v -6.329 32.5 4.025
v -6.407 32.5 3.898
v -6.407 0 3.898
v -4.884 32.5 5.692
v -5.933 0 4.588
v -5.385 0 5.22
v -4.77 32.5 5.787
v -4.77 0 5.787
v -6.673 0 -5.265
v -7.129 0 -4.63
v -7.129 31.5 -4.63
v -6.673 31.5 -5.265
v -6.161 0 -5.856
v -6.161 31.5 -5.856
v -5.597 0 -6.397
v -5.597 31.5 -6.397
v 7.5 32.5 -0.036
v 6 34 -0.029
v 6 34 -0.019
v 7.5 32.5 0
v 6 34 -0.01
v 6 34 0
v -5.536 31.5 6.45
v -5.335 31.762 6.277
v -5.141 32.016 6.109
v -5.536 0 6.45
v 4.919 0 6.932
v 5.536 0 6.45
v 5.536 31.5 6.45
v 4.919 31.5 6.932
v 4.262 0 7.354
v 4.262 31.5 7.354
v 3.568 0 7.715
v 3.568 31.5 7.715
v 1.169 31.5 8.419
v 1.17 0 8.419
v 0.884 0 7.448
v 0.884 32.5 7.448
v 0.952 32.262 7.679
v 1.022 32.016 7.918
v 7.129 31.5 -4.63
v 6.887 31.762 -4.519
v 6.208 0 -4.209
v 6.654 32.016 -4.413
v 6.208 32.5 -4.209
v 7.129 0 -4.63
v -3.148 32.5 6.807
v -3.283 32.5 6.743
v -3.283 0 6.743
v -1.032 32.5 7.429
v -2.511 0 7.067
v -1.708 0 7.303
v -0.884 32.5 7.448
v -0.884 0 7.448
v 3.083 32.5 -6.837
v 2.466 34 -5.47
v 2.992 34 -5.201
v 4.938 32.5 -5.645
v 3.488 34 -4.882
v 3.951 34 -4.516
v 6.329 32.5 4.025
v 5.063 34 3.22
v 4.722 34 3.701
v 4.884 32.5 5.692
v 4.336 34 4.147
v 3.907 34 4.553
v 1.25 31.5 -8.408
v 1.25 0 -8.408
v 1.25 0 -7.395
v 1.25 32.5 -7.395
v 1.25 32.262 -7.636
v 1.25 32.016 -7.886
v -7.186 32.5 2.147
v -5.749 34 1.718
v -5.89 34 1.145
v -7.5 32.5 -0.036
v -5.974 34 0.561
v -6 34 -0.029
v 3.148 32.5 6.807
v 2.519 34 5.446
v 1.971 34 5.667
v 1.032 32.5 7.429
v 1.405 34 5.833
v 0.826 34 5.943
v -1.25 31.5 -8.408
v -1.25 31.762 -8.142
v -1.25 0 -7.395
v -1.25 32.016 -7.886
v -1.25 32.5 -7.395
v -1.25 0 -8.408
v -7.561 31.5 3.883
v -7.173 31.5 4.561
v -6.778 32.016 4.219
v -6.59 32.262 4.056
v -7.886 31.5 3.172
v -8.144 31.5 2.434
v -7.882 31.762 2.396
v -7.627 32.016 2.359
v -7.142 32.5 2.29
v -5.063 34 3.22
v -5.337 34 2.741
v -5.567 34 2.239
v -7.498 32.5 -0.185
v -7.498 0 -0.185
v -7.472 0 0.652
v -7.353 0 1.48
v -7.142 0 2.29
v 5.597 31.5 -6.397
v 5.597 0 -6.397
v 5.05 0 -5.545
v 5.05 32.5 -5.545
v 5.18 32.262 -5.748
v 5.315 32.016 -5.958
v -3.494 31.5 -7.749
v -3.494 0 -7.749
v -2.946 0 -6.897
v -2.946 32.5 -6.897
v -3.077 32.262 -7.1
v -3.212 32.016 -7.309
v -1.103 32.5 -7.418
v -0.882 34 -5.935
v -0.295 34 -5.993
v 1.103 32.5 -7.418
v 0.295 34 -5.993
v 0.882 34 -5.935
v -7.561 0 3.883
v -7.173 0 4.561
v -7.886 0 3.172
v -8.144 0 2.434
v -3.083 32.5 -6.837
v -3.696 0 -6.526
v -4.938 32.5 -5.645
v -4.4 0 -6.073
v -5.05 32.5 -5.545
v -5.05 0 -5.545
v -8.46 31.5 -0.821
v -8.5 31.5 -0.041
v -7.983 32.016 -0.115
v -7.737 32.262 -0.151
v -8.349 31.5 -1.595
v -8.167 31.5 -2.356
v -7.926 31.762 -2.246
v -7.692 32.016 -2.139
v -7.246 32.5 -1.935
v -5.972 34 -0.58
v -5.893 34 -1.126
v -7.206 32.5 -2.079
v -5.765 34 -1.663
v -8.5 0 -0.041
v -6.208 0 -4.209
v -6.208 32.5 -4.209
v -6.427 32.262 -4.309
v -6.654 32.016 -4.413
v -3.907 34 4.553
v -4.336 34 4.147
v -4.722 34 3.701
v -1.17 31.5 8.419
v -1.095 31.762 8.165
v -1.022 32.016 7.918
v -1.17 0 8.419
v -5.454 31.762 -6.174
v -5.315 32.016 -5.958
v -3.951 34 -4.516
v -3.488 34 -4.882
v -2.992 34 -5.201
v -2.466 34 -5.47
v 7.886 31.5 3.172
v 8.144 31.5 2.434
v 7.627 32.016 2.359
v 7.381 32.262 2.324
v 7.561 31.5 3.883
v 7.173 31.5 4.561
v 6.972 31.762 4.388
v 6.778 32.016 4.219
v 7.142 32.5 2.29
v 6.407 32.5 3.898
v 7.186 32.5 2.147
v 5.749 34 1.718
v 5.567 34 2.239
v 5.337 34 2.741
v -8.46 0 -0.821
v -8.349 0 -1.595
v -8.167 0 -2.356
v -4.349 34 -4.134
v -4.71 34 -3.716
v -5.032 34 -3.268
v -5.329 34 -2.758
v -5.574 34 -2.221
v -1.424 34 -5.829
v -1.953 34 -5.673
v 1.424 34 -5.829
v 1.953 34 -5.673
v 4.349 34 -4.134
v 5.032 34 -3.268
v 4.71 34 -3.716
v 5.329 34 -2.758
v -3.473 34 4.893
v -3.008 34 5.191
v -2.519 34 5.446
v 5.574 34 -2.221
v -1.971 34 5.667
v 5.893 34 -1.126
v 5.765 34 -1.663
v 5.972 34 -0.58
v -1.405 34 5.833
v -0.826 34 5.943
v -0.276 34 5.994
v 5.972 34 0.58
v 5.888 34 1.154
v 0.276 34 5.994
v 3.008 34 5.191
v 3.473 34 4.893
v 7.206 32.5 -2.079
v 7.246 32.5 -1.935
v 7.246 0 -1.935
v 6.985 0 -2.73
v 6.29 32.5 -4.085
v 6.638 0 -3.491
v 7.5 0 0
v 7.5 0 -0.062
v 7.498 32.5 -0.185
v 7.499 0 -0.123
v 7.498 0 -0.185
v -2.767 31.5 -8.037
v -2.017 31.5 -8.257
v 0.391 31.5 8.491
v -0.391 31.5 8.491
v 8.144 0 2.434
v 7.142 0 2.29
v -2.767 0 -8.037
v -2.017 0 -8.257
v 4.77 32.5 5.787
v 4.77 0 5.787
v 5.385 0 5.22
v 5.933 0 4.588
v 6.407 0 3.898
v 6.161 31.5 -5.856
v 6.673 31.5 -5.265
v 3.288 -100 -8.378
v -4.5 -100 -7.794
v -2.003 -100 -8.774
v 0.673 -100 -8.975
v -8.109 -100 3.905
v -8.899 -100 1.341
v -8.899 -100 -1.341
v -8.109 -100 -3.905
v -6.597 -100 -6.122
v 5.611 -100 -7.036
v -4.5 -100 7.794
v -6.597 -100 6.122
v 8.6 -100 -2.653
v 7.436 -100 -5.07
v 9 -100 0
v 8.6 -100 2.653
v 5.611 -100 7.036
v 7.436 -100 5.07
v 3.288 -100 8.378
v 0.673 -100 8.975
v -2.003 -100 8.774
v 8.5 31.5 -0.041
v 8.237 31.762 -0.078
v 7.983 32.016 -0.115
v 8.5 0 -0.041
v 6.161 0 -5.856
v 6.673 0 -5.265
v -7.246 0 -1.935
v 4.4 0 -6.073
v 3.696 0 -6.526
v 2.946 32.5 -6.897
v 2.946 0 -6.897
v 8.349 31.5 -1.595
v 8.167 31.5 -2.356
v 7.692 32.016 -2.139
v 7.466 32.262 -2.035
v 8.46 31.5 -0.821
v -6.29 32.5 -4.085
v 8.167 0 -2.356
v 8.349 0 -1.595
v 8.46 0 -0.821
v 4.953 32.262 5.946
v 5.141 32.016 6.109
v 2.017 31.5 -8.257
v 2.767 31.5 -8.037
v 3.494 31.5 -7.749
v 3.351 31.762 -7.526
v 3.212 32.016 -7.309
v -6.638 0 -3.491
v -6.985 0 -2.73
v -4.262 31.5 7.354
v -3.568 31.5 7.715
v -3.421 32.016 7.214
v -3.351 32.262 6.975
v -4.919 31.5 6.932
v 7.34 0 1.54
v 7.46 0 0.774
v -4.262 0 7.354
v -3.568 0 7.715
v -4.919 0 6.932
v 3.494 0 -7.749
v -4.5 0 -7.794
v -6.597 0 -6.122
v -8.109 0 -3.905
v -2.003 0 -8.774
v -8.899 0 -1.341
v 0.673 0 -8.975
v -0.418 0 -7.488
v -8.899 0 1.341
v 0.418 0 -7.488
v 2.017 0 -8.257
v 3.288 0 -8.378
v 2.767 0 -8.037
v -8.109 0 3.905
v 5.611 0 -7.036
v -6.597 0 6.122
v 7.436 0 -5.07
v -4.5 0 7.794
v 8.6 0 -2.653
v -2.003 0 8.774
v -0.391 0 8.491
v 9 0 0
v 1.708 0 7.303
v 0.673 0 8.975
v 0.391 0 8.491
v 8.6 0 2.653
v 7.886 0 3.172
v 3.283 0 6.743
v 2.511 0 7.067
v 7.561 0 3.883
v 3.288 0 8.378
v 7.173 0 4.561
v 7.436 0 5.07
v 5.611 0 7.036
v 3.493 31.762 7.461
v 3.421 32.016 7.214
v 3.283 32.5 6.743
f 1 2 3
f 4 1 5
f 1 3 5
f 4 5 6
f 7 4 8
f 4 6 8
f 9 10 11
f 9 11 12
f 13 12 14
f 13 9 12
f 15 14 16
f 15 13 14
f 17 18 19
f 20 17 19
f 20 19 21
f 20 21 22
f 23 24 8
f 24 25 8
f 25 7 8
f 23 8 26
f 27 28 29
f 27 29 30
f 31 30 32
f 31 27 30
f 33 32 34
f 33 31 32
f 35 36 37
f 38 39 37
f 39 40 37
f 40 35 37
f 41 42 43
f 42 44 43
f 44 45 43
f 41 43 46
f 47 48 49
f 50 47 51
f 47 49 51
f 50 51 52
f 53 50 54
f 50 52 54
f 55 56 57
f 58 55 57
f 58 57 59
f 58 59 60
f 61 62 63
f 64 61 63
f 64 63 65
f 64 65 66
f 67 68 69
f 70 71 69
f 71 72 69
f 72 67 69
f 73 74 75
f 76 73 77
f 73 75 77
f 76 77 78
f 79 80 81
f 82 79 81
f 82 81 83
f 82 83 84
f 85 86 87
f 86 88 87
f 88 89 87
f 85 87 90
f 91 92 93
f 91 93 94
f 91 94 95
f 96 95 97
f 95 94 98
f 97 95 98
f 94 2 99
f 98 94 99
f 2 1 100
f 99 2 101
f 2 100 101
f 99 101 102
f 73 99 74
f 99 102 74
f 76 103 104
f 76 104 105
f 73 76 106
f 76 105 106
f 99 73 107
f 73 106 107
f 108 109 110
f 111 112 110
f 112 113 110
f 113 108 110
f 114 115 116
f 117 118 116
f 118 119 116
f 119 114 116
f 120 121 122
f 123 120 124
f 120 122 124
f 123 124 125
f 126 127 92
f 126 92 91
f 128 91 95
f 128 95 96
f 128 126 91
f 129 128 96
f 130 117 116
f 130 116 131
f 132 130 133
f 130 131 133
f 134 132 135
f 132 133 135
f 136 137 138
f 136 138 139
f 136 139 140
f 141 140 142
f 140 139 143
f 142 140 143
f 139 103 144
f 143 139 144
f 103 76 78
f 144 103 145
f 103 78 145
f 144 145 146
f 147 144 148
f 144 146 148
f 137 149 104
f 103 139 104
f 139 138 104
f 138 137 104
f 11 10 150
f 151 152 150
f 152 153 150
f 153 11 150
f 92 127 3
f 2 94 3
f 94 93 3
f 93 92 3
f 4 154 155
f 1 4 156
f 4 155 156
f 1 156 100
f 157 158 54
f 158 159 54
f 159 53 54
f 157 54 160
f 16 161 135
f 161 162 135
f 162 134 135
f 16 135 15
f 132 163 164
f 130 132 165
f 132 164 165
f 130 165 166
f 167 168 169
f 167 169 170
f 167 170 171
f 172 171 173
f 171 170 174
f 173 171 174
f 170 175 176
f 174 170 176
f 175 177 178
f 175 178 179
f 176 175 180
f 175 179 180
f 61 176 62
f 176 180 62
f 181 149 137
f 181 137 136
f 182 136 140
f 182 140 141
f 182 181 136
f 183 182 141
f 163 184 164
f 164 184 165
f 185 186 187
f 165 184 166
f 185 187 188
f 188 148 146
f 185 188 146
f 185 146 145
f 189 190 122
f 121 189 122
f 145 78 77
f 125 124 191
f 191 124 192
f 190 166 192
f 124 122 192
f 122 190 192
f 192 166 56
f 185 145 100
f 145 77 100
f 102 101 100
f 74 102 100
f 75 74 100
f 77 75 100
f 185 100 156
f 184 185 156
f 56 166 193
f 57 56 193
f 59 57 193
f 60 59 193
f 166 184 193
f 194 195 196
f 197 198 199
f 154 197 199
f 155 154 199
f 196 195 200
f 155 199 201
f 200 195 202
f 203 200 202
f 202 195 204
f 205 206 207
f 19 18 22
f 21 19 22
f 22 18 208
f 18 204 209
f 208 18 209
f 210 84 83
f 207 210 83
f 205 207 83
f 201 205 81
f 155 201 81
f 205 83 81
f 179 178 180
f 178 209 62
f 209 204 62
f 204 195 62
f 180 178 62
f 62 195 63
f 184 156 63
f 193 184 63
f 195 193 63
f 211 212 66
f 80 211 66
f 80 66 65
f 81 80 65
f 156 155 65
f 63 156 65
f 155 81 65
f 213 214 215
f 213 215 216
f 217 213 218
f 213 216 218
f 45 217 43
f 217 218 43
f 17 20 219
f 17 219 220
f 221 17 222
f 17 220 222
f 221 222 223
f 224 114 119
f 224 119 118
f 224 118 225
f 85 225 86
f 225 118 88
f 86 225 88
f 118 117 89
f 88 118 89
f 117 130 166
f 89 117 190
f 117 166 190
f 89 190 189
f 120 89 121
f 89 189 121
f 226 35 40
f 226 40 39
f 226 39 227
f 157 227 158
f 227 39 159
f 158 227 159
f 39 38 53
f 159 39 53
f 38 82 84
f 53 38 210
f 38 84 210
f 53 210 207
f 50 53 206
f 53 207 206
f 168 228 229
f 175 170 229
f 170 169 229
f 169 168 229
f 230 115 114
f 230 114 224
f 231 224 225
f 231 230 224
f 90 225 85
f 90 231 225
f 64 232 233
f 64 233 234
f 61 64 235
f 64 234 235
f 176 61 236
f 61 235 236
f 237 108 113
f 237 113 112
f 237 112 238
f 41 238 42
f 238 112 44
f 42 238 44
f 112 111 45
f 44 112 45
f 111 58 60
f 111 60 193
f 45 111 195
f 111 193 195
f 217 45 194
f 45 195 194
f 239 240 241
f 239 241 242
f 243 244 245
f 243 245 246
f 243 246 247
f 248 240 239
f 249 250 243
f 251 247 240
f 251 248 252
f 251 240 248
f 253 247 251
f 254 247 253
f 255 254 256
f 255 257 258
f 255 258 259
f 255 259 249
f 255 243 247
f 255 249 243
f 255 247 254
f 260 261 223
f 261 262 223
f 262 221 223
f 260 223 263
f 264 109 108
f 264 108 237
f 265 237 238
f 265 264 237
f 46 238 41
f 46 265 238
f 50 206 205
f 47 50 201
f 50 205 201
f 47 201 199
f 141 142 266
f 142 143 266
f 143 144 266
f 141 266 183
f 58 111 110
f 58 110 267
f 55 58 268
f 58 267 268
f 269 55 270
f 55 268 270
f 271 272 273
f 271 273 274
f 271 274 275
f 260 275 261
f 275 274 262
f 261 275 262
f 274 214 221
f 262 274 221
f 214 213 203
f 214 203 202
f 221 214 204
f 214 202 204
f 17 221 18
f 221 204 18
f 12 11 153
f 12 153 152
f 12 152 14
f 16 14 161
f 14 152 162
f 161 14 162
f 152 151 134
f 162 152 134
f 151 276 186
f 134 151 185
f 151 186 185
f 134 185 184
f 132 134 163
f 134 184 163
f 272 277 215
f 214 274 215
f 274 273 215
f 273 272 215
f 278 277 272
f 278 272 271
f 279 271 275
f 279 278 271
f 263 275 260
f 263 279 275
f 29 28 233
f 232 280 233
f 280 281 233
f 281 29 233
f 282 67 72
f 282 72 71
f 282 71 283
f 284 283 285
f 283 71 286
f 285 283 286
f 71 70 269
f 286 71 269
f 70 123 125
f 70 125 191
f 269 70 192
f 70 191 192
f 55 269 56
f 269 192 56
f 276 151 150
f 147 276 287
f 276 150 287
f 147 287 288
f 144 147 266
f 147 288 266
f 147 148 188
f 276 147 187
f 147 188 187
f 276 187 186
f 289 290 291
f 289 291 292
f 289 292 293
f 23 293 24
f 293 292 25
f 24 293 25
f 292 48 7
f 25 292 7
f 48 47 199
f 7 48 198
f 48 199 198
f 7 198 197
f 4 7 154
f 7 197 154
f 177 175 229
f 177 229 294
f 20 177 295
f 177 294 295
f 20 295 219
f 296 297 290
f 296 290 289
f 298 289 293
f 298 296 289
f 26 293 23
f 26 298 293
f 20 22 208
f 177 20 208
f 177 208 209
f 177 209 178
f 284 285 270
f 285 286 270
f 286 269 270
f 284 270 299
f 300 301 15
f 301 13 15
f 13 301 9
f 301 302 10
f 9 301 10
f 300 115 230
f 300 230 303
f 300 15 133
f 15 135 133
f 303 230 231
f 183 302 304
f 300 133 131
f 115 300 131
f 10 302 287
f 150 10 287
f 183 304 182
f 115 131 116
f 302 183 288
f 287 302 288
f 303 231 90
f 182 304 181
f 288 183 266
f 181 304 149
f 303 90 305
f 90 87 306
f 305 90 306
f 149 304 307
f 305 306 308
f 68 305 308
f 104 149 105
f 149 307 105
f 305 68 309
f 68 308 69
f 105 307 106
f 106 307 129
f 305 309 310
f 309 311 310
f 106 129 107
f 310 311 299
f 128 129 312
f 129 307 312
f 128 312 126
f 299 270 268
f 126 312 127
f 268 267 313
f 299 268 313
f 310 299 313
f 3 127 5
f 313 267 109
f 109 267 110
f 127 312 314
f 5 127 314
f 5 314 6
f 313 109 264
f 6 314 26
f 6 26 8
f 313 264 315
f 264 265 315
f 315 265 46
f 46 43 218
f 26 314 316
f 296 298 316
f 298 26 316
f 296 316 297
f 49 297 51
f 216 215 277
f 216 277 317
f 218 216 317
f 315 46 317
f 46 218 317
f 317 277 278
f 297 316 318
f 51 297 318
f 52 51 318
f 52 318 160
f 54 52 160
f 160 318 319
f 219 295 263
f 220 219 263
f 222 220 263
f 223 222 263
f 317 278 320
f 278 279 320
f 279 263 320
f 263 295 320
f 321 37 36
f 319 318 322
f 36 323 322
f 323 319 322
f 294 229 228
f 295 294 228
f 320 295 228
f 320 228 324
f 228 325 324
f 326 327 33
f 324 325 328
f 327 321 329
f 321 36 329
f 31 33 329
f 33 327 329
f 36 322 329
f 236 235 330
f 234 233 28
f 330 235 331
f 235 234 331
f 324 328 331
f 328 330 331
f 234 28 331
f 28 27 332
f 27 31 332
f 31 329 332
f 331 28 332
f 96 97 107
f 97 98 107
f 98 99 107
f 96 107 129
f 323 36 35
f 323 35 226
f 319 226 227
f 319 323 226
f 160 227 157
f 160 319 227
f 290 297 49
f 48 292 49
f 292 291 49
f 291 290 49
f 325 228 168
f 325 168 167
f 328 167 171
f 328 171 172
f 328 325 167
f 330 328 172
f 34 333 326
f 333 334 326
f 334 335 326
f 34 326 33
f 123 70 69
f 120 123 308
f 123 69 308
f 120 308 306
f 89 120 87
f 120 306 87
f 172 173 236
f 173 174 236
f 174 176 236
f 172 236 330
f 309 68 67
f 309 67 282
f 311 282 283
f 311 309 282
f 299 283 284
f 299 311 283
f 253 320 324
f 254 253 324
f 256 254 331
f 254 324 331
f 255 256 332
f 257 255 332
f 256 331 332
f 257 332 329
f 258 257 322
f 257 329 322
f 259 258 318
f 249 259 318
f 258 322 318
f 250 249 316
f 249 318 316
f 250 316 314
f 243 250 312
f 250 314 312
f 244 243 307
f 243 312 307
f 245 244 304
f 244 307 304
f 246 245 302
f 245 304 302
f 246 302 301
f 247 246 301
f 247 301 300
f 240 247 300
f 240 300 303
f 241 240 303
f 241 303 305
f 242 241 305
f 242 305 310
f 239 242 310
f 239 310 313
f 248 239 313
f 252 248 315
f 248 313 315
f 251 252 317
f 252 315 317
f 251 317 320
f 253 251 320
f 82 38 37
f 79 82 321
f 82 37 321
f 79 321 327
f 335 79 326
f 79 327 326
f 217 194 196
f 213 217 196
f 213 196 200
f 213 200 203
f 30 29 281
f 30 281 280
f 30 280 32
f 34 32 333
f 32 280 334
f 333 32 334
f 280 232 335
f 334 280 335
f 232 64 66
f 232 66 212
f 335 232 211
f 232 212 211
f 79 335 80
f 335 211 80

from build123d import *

# Parameters (mm, degrees)
F0_R     = 9
F1_DEPTH = 100
F3_DEPTH = 34
F4_SIZE  = 2.5
F5_DEPTH = 34


with BuildPart() as f1:
    # F0 (on Front) → F1 (new body)
    with BuildSketch(Plane.XZ):
        Circle(F0_R)
    extrude(amount=F1_DEPTH)

    # F2 (on Front) → F3 (join)
    with BuildSketch(Plane.XZ):
        with BuildLine():
            ThreePointArc((8.499903, -0.040575), (8.499976, -0.020288), (8.5, 0))
            ThreePointArc((8.5, 0), (8.410571, 1.229754), (8.144166, 2.433631))
            Line((8.144166, 2.433631), (7.141912, 2.28978))
            ThreePointArc((7.141912, 2.28978), (7.409937, 1.158806), (7.5, 0))
            ThreePointArc((7.5, 0), (7.49943, -0.092467), (7.49772, -0.184919))
            Line((7.49772, -0.184919), (8.499903, -0.040575))
        make_face()
        with BuildLine():
            Line((7.141912, 2.28978), (8.144166, 2.433631))
            ThreePointArc((8.144166, 2.433631), (7.731872, 3.531028), (7.17251, 4.56126))
            Line((7.17251, 4.56126), (6.407458, 3.89801))
            ThreePointArc((6.407458, 3.89801), (6.82224, 3.115613), (7.141912, 2.28978))
        make_face()
        with BuildLine():
            ThreePointArc((8.167029, -2.355768), (8.413482, -1.209676), (8.499903, -0.040575))
            Line((8.499903, -0.040575), (7.49772, -0.184919))
            ThreePointArc((7.49772, -0.184919), (7.423661, -1.067361), (7.246107, -1.934923))
            Line((7.246107, -1.934923), (8.167029, -2.355768))
        make_face()
        with BuildLine():
            Line((6.407458, 3.89801), (7.17251, 4.56126))
            ThreePointArc((7.17251, 4.56126), (6.423871, 5.566316), (5.535588, 6.450369))
            Line((5.535588, 6.450369), (4.77021, 5.787495))
            ThreePointArc((4.77021, 5.787495), (5.668122, 4.911456), (6.407458, 3.89801))
        make_face()
        with BuildLine():
            ThreePointArc((7.128637, -4.629529), (7.731872, -3.531028), (8.167029, -2.355768))
            Line((8.167029, -2.355768), (7.246107, -1.934923))
            ThreePointArc((7.246107, -1.934923), (6.82224, -3.115613), (6.207509, -4.209137))
            Line((6.207509, -4.209137), (7.128637, -4.629529))
        make_face()
        with BuildLine():
            Line((4.77021, 5.787495), (5.535588, 6.450369))
            ThreePointArc((5.535588, 6.450369), (4.595447, 7.150655), (3.567896, 7.714928))
            Line((3.567896, 7.714928), (3.282874, 6.743348))
            ThreePointArc((3.282874, 6.743348), (4.054806, 6.309401), (4.77021, 5.787495))
        make_face()
        with BuildLine():
            ThreePointArc((5.596918, -6.397227), (6.423871, -5.566316), (7.128637, -4.629529))
            Line((7.128637, -4.629529), (6.207509, -4.209137))
            ThreePointArc((6.207509, -4.209137), (5.668122, -4.911456), (5.049715, -5.545302))
            Line((5.049715, -5.545302), (5.596918, -6.397227))
        make_face()
        with BuildLine():
            Line((3.282874, 6.743348), (3.567896, 7.714928))
            ThreePointArc((3.567896, 7.714928), (2.394727, 8.15569), (1.1695, 8.419161))
            Line((1.1695, 8.419161), (0.884, 7.447721))
            ThreePointArc((0.884, 7.447721), (2.112994, 7.196197), (3.282874, 6.743348))
        make_face()
        with BuildLine():
            ThreePointArc((3.494079, -7.748639), (4.595447, -7.150655), (5.596918, -6.397227))
            Line((5.596918, -6.397227), (5.049715, -5.545302))
            ThreePointArc((5.049715, -5.545302), (4.054806, -6.309401), (2.946457, -6.896984))
            Line((2.946457, -6.896984), (3.494079, -7.748639))
        make_face()
        with BuildLine():
            Line((0.884, 7.447721), (1.1695, 8.419161))
            ThreePointArc((1.1695, 8.419161), (0, 8.5), (-1.1695, 8.419161))
            Line((-1.1695, 8.419161), (-0.884, 7.447721))
            ThreePointArc((-0.884, 7.447721), (0, 7.5), (0.884, 7.447721))
        make_face()
        with BuildLine():
            ThreePointArc((1.249825, -8.407612), (2.394727, -8.15569), (3.494079, -7.748639))
            Line((3.494079, -7.748639), (2.946457, -6.896984))
            ThreePointArc((2.946457, -6.896984), (2.112994, -7.196197), (1.250074, -7.395087))
            Line((1.250074, -7.395087), (1.249825, -8.407612))
        make_face()
        with BuildLine():
            Line((-0.884, 7.447721), (-1.1695, 8.419161))
            ThreePointArc((-1.1695, 8.419161), (-2.394727, 8.15569), (-3.567896, 7.714928))
            Line((-3.567896, 7.714928), (-3.282874, 6.743348))
            ThreePointArc((-3.282874, 6.743348), (-2.112994, 7.196197), (-0.884, 7.447721))
        make_face()
        with BuildLine():
            ThreePointArc((-1.249825, -8.407612), (0, -8.5), (1.249825, -8.407612))
            Line((1.249825, -8.407612), (1.250074, -7.395087))
            ThreePointArc((1.250074, -7.395087), (0, -7.5), (-1.250074, -7.395087))
            Line((-1.250074, -7.395087), (-1.249825, -8.407612))
        make_face()
        with BuildLine():
            Line((-3.282874, 6.743348), (-3.567896, 7.714928))
            ThreePointArc((-3.567896, 7.714928), (-4.595447, 7.150655), (-5.535588, 6.450369))
            Line((-5.535588, 6.450369), (-4.77021, 5.787495))
            ThreePointArc((-4.77021, 5.787495), (-4.054806, 6.309401), (-3.282874, 6.743348))
        make_face()
        with BuildLine():
            ThreePointArc((-3.494079, -7.748639), (-2.394727, -8.15569), (-1.249825, -8.407612))
            Line((-1.249825, -8.407612), (-1.250074, -7.395087))
            ThreePointArc((-1.250074, -7.395087), (-2.112994, -7.196197), (-2.946457, -6.896984))
            Line((-2.946457, -6.896984), (-3.494079, -7.748639))
        make_face()
        with BuildLine():
            Line((-4.77021, 5.787495), (-5.535588, 6.450369))
            ThreePointArc((-5.535588, 6.450369), (-6.423871, 5.566316), (-7.17251, 4.56126))
            Line((-7.17251, 4.56126), (-6.407458, 3.89801))
            ThreePointArc((-6.407458, 3.89801), (-5.668122, 4.911456), (-4.77021, 5.787495))
        make_face()
        with BuildLine():
            ThreePointArc((-5.596918, -6.397227), (-4.595447, -7.150655), (-3.494079, -7.748639))
            Line((-3.494079, -7.748639), (-2.946457, -6.896984))
            ThreePointArc((-2.946457, -6.896984), (-4.054806, -6.309401), (-5.049715, -5.545302))
            Line((-5.049715, -5.545302), (-5.596918, -6.397227))
        make_face()
        with BuildLine():
            Line((-6.407458, 3.89801), (-7.17251, 4.56126))
            ThreePointArc((-7.17251, 4.56126), (-7.731872, 3.531028), (-8.144166, 2.433631))
            Line((-8.144166, 2.433631), (-7.141912, 2.28978))
            ThreePointArc((-7.141912, 2.28978), (-6.82224, 3.115613), (-6.407458, 3.89801))
        make_face()
        with BuildLine():
            ThreePointArc((-7.128637, -4.629529), (-6.423871, -5.566316), (-5.596918, -6.397227))
            Line((-5.596918, -6.397227), (-5.049715, -5.545302))
            ThreePointArc((-5.049715, -5.545302), (-5.668122, -4.911456), (-6.207509, -4.209137))
            Line((-6.207509, -4.209137), (-7.128637, -4.629529))
        make_face()
        with BuildLine():
            Line((-7.141912, 2.28978), (-8.144166, 2.433631))
            ThreePointArc((-8.144166, 2.433631), (-8.413482, 1.209676), (-8.499903, -0.040575))
            Line((-8.499903, -0.040575), (-7.49772, -0.184919))
            ThreePointArc((-7.49772, -0.184919), (-7.423661, 1.067361), (-7.141912, 2.28978))
        make_face()
        with BuildLine():
            ThreePointArc((-8.167029, -2.355768), (-7.731872, -3.531028), (-7.128637, -4.629529))
            Line((-7.128637, -4.629529), (-6.207509, -4.209137))
            ThreePointArc((-6.207509, -4.209137), (-6.82224, -3.115613), (-7.246107, -1.934923))
            Line((-7.246107, -1.934923), (-8.167029, -2.355768))
        make_face()
        with BuildLine():
            Line((-7.49772, -0.184919), (-8.499903, -0.040575))
            ThreePointArc((-8.499903, -0.040575), (-8.413482, -1.209676), (-8.167029, -2.355768))
            Line((-8.167029, -2.355768), (-7.246107, -1.934923))
            ThreePointArc((-7.246107, -1.934923), (-7.423661, -1.067361), (-7.49772, -0.184919))
        make_face()
        with BuildLine():
            ThreePointArc((7.5, 0), (7.409937, 1.158806), (7.141912, 2.28978))
            ThreePointArc((7.141912, 2.28978), (6.82224, 3.115613), (6.407458, 3.89801))
            ThreePointArc((6.407458, 3.89801), (5.668122, 4.911456), (4.77021, 5.787495))
            ThreePointArc((4.77021, 5.787495), (4.054806, 6.309401), (3.282874, 6.743348))
            ThreePointArc((3.282874, 6.743348), (2.112994, 7.196197), (0.884, 7.447721))
            ThreePointArc((0.884, 7.447721), (0, 7.5), (-0.884, 7.447721))
            ThreePointArc((-0.884, 7.447721), (-2.112994, 7.196197), (-3.282874, 6.743348))
            ThreePointArc((-3.282874, 6.743348), (-4.054806, 6.309401), (-4.77021, 5.787495))
            ThreePointArc((-4.77021, 5.787495), (-5.668122, 4.911456), (-6.407458, 3.89801))
            ThreePointArc((-6.407458, 3.89801), (-6.82224, 3.115613), (-7.141912, 2.28978))
            ThreePointArc((-7.141912, 2.28978), (-7.423661, 1.067361), (-7.49772, -0.184919))
            ThreePointArc((-7.49772, -0.184919), (-7.423661, -1.067361), (-7.246107, -1.934923))
            ThreePointArc((-7.246107, -1.934923), (-6.82224, -3.115613), (-6.207509, -4.209137))
            ThreePointArc((-6.207509, -4.209137), (-5.668122, -4.911456), (-5.049715, -5.545302))
            ThreePointArc((-5.049715, -5.545302), (-4.054806, -6.309401), (-2.946457, -6.896984))
            ThreePointArc((-2.946457, -6.896984), (-2.112994, -7.196197), (-1.250074, -7.395087))
            ThreePointArc((-1.250074, -7.395087), (0, -7.5), (1.250074, -7.395087))
            ThreePointArc((1.250074, -7.395087), (2.112994, -7.196197), (2.946457, -6.896984))
            ThreePointArc((2.946457, -6.896984), (4.054806, -6.309401), (5.049715, -5.545302))
            ThreePointArc((5.049715, -5.545302), (5.668122, -4.911456), (6.207509, -4.209137))
            ThreePointArc((6.207509, -4.209137), (6.82224, -3.115613), (7.246107, -1.934923))
            ThreePointArc((7.246107, -1.934923), (7.423661, -1.067361), (7.49772, -0.184919))
            ThreePointArc((7.49772, -0.184919), (7.49943, -0.092467), (7.5, 0))
        make_face()
    extrude(amount=-F3_DEPTH)

    # F4
    f4_edges = [f1.edges().sort_by_distance(p)[0] for p in [
        (8.499903, 34, 0.040575),
    ]]
    chamfer(f4_edges, length=F4_SIZE)

    # F2 (on Front) → F5 (cut)
    with BuildSketch(Plane.XZ):
        with BuildLine():
            ThreePointArc((-5.596918, -6.397227), (-4.595447, -7.150655), (-3.494079, -7.748639))
            Line((-3.494079, -7.748639), (-2.946457, -6.896984))
            ThreePointArc((-2.946457, -6.896984), (-4.054806, -6.309401), (-5.049715, -5.545302))
            Line((-5.049715, -5.545302), (-5.596918, -6.397227))
        make_face()
        with BuildLine():
            ThreePointArc((-8.167029, -2.355768), (-7.731872, -3.531028), (-7.128637, -4.629529))
            Line((-7.128637, -4.629529), (-6.207509, -4.209137))
            ThreePointArc((-6.207509, -4.209137), (-6.82224, -3.115613), (-7.246107, -1.934923))
            Line((-7.246107, -1.934923), (-8.167029, -2.355768))
        make_face()
        with BuildLine():
            Line((-7.141912, 2.28978), (-8.144166, 2.433631))
            ThreePointArc((-8.144166, 2.433631), (-8.413482, 1.209676), (-8.499903, -0.040575))
            Line((-8.499903, -0.040575), (-7.49772, -0.184919))
            ThreePointArc((-7.49772, -0.184919), (-7.423661, 1.067361), (-7.141912, 2.28978))
        make_face()
        with BuildLine():
            Line((-4.77021, 5.787495), (-5.535588, 6.450369))
            ThreePointArc((-5.535588, 6.450369), (-6.423871, 5.566316), (-7.17251, 4.56126))
            Line((-7.17251, 4.56126), (-6.407458, 3.89801))
            ThreePointArc((-6.407458, 3.89801), (-5.668122, 4.911456), (-4.77021, 5.787495))
        make_face()
        with BuildLine():
            Line((-0.884, 7.447721), (-1.1695, 8.419161))
            ThreePointArc((-1.1695, 8.419161), (-2.394727, 8.15569), (-3.567896, 7.714928))
            Line((-3.567896, 7.714928), (-3.282874, 6.743348))
            ThreePointArc((-3.282874, 6.743348), (-2.112994, 7.196197), (-0.884, 7.447721))
        make_face()
        with BuildLine():
            Line((3.282874, 6.743348), (3.567896, 7.714928))
            ThreePointArc((3.567896, 7.714928), (2.394727, 8.15569), (1.1695, 8.419161))
            Line((1.1695, 8.419161), (0.884, 7.447721))
            ThreePointArc((0.884, 7.447721), (2.112994, 7.196197), (3.282874, 6.743348))
        make_face()
        with BuildLine():
            Line((6.407458, 3.89801), (7.17251, 4.56126))
            ThreePointArc((7.17251, 4.56126), (6.423871, 5.566316), (5.535588, 6.450369))
            Line((5.535588, 6.450369), (4.77021, 5.787495))
            ThreePointArc((4.77021, 5.787495), (5.668122, 4.911456), (6.407458, 3.89801))
        make_face()
        with BuildLine():
            ThreePointArc((8.499903, -0.040575), (8.499976, -0.020288), (8.5, 0))
            ThreePointArc((8.5, 0), (8.410571, 1.229754), (8.144166, 2.433631))
            Line((8.144166, 2.433631), (7.141912, 2.28978))
            ThreePointArc((7.141912, 2.28978), (7.409937, 1.158806), (7.5, 0))
            ThreePointArc((7.5, 0), (7.49943, -0.092467), (7.49772, -0.184919))
            Line((7.49772, -0.184919), (8.499903, -0.040575))
        make_face()
        with BuildLine():
            ThreePointArc((7.128637, -4.629529), (7.731872, -3.531028), (8.167029, -2.355768))
            Line((8.167029, -2.355768), (7.246107, -1.934923))
            ThreePointArc((7.246107, -1.934923), (6.82224, -3.115613), (6.207509, -4.209137))
            Line((6.207509, -4.209137), (7.128637, -4.629529))
        make_face()
        with BuildLine():
            ThreePointArc((3.494079, -7.748639), (4.595447, -7.150655), (5.596918, -6.397227))
            Line((5.596918, -6.397227), (5.049715, -5.545302))
            ThreePointArc((5.049715, -5.545302), (4.054806, -6.309401), (2.946457, -6.896984))
            Line((2.946457, -6.896984), (3.494079, -7.748639))
        make_face()
        with BuildLine():
            ThreePointArc((-1.249825, -8.407612), (0, -8.5), (1.249825, -8.407612))
            Line((1.249825, -8.407612), (1.250074, -7.395087))
            ThreePointArc((1.250074, -7.395087), (0, -7.5), (-1.250074, -7.395087))
            Line((-1.250074, -7.395087), (-1.249825, -8.407612))
        make_face()
    extrude(amount=-F5_DEPTH, mode=Mode.SUBTRACT)


solid = f1.part
